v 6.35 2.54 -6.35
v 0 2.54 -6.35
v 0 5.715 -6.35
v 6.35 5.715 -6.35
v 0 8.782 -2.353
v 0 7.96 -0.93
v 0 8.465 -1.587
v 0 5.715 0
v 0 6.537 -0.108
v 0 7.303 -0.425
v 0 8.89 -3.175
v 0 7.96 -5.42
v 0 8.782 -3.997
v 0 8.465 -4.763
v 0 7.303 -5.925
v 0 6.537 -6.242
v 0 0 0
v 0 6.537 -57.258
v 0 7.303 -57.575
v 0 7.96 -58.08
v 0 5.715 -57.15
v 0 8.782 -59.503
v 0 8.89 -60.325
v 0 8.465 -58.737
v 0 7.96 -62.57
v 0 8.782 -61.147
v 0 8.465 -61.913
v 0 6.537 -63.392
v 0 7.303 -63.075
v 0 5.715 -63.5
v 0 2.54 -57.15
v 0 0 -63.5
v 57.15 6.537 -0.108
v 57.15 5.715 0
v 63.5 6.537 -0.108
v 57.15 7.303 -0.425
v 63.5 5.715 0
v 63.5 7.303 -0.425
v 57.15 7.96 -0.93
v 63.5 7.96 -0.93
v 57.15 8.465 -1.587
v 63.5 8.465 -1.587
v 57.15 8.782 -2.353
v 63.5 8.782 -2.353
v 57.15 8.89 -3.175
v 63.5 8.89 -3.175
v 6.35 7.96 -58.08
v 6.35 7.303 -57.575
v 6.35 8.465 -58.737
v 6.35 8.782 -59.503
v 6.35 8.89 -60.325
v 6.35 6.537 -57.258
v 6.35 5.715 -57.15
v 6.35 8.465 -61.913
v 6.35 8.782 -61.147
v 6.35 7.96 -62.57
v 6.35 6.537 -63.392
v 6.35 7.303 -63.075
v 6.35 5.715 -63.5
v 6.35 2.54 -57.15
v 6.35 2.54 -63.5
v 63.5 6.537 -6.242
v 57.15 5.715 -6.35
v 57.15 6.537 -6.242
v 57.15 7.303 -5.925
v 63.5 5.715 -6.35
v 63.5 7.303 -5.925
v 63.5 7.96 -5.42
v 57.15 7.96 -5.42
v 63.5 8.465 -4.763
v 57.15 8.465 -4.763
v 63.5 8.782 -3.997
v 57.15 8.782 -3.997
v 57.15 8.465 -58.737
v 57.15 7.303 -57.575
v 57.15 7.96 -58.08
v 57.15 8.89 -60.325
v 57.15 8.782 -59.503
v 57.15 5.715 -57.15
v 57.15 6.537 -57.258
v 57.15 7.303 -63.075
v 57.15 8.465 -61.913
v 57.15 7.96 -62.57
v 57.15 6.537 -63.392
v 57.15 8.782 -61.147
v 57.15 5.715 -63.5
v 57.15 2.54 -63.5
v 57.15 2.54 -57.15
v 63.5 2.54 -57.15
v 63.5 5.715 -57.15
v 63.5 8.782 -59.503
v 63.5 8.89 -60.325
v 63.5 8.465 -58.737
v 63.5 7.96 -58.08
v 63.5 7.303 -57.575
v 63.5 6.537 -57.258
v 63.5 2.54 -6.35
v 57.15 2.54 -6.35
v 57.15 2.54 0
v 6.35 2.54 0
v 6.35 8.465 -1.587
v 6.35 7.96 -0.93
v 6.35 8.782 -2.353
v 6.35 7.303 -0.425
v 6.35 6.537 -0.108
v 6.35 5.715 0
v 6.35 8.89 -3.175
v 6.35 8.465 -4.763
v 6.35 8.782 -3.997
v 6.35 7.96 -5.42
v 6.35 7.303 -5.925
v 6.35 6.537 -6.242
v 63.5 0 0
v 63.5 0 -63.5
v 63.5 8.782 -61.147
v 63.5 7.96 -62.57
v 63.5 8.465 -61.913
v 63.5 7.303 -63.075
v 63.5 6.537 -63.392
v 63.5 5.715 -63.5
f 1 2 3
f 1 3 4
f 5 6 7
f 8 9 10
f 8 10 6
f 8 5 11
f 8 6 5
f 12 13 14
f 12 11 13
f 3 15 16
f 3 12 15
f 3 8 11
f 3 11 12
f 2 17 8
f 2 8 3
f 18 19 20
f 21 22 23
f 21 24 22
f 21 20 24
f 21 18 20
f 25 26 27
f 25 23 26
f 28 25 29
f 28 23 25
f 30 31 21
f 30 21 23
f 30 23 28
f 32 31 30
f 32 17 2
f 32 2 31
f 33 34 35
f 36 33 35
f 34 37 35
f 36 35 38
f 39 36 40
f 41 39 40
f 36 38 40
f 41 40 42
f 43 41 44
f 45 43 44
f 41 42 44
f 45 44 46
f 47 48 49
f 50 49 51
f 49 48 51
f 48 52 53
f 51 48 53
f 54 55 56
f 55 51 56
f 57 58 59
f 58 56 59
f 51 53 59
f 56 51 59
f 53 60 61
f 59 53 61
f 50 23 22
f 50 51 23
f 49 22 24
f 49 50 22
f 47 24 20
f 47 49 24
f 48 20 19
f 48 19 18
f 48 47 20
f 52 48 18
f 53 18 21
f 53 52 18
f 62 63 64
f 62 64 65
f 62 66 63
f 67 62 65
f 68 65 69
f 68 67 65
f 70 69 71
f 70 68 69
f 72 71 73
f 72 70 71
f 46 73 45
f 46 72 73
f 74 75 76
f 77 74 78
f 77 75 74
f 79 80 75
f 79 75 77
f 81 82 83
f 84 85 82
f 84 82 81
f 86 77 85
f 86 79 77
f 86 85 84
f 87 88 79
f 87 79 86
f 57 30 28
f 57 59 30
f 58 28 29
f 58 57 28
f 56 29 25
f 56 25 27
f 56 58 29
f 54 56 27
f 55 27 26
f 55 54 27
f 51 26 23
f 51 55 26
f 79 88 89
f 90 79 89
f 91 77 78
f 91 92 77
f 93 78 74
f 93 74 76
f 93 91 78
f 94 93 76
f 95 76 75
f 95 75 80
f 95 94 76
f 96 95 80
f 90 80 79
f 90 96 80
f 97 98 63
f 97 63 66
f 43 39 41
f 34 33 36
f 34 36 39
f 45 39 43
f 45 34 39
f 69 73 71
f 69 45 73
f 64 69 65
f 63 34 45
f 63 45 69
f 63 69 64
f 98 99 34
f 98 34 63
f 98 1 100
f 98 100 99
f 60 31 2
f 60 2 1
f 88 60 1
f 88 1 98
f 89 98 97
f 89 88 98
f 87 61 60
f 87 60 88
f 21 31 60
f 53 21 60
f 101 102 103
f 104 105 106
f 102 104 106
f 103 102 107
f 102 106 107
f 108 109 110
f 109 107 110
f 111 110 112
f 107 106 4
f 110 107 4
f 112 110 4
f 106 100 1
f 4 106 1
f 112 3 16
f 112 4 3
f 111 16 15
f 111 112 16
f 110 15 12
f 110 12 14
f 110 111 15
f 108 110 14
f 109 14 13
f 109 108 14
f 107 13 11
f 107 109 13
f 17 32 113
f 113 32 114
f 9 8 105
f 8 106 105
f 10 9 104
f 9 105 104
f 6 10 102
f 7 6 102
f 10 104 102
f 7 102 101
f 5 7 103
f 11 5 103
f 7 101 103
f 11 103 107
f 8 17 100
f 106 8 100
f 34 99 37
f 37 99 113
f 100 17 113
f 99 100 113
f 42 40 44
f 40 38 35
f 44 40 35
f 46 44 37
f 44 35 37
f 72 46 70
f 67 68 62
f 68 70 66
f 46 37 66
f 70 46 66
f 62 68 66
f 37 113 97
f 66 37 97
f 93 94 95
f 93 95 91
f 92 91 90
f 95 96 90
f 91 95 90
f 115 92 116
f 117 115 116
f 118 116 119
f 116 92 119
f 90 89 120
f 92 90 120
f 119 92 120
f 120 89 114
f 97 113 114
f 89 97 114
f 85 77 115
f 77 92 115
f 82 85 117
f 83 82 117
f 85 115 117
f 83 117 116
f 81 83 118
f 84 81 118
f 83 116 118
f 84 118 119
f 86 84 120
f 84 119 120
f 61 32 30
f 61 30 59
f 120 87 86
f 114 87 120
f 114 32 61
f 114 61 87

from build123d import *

# Parameters (mm, degrees)
SKETCH1_W           = 63.5
SKETCH1_H           = 63.5
BOSS_EXTRUDE1_DEPTH = 2.54
SKETCH2_W           = 6.35
SKETCH2_H           = 6.35
BOSS_EXTRUDE2_DEPTH = 6.35
FILLET1_R           = 3.175


with BuildPart() as part:
    # Sketch1 → Boss-Extrude1 (new body)
    with BuildSketch(Plane(origin=(0, 0, 0), x_dir=(1, 0, 0), z_dir=(0, 1, 0))):
        with Locations((31.75, 31.75)):
            Rectangle(SKETCH1_W, SKETCH1_H)
    extrude(amount=BOSS_EXTRUDE1_DEPTH)

    # Sketch2 → Boss-Extrude2 (add)
    with BuildSketch(Plane(origin=(0, 2.54, 0), x_dir=(1, 0, 0), z_dir=(0, 1, 0))):
        with Locations((3.175, 3.175)):
            Rectangle(SKETCH2_W, SKETCH2_H)
        with Locations((60.325, 3.175)):
            Rectangle(SKETCH2_W, SKETCH2_H)
        with Locations((3.175, 60.325)):
            Rectangle(SKETCH2_W, SKETCH2_H)
        with Locations((60.325, 60.325)):
            Rectangle(SKETCH2_W, SKETCH2_H)
    extrude(amount=BOSS_EXTRUDE2_DEPTH)

    # Fillet1
    fillet1_edges = [part.edges().sort_by_distance(p)[0] for p in [
        (3.175, 8.89, -6.35),
        (3.175, 8.89, 0),
        (60.325, 8.89, 0),
        (60.325, 8.89, -6.35),
        (60.325, 8.89, -63.5),
        (60.325, 8.89, -57.15),
        (3.175, 8.89, -63.5),
        (3.175, 8.89, -57.15),
    ]]
    fillet(fillet1_edges, radius=FILLET1_R - 0.0001)  # a hair under: the kernel refuses the full size


solid = part.part
